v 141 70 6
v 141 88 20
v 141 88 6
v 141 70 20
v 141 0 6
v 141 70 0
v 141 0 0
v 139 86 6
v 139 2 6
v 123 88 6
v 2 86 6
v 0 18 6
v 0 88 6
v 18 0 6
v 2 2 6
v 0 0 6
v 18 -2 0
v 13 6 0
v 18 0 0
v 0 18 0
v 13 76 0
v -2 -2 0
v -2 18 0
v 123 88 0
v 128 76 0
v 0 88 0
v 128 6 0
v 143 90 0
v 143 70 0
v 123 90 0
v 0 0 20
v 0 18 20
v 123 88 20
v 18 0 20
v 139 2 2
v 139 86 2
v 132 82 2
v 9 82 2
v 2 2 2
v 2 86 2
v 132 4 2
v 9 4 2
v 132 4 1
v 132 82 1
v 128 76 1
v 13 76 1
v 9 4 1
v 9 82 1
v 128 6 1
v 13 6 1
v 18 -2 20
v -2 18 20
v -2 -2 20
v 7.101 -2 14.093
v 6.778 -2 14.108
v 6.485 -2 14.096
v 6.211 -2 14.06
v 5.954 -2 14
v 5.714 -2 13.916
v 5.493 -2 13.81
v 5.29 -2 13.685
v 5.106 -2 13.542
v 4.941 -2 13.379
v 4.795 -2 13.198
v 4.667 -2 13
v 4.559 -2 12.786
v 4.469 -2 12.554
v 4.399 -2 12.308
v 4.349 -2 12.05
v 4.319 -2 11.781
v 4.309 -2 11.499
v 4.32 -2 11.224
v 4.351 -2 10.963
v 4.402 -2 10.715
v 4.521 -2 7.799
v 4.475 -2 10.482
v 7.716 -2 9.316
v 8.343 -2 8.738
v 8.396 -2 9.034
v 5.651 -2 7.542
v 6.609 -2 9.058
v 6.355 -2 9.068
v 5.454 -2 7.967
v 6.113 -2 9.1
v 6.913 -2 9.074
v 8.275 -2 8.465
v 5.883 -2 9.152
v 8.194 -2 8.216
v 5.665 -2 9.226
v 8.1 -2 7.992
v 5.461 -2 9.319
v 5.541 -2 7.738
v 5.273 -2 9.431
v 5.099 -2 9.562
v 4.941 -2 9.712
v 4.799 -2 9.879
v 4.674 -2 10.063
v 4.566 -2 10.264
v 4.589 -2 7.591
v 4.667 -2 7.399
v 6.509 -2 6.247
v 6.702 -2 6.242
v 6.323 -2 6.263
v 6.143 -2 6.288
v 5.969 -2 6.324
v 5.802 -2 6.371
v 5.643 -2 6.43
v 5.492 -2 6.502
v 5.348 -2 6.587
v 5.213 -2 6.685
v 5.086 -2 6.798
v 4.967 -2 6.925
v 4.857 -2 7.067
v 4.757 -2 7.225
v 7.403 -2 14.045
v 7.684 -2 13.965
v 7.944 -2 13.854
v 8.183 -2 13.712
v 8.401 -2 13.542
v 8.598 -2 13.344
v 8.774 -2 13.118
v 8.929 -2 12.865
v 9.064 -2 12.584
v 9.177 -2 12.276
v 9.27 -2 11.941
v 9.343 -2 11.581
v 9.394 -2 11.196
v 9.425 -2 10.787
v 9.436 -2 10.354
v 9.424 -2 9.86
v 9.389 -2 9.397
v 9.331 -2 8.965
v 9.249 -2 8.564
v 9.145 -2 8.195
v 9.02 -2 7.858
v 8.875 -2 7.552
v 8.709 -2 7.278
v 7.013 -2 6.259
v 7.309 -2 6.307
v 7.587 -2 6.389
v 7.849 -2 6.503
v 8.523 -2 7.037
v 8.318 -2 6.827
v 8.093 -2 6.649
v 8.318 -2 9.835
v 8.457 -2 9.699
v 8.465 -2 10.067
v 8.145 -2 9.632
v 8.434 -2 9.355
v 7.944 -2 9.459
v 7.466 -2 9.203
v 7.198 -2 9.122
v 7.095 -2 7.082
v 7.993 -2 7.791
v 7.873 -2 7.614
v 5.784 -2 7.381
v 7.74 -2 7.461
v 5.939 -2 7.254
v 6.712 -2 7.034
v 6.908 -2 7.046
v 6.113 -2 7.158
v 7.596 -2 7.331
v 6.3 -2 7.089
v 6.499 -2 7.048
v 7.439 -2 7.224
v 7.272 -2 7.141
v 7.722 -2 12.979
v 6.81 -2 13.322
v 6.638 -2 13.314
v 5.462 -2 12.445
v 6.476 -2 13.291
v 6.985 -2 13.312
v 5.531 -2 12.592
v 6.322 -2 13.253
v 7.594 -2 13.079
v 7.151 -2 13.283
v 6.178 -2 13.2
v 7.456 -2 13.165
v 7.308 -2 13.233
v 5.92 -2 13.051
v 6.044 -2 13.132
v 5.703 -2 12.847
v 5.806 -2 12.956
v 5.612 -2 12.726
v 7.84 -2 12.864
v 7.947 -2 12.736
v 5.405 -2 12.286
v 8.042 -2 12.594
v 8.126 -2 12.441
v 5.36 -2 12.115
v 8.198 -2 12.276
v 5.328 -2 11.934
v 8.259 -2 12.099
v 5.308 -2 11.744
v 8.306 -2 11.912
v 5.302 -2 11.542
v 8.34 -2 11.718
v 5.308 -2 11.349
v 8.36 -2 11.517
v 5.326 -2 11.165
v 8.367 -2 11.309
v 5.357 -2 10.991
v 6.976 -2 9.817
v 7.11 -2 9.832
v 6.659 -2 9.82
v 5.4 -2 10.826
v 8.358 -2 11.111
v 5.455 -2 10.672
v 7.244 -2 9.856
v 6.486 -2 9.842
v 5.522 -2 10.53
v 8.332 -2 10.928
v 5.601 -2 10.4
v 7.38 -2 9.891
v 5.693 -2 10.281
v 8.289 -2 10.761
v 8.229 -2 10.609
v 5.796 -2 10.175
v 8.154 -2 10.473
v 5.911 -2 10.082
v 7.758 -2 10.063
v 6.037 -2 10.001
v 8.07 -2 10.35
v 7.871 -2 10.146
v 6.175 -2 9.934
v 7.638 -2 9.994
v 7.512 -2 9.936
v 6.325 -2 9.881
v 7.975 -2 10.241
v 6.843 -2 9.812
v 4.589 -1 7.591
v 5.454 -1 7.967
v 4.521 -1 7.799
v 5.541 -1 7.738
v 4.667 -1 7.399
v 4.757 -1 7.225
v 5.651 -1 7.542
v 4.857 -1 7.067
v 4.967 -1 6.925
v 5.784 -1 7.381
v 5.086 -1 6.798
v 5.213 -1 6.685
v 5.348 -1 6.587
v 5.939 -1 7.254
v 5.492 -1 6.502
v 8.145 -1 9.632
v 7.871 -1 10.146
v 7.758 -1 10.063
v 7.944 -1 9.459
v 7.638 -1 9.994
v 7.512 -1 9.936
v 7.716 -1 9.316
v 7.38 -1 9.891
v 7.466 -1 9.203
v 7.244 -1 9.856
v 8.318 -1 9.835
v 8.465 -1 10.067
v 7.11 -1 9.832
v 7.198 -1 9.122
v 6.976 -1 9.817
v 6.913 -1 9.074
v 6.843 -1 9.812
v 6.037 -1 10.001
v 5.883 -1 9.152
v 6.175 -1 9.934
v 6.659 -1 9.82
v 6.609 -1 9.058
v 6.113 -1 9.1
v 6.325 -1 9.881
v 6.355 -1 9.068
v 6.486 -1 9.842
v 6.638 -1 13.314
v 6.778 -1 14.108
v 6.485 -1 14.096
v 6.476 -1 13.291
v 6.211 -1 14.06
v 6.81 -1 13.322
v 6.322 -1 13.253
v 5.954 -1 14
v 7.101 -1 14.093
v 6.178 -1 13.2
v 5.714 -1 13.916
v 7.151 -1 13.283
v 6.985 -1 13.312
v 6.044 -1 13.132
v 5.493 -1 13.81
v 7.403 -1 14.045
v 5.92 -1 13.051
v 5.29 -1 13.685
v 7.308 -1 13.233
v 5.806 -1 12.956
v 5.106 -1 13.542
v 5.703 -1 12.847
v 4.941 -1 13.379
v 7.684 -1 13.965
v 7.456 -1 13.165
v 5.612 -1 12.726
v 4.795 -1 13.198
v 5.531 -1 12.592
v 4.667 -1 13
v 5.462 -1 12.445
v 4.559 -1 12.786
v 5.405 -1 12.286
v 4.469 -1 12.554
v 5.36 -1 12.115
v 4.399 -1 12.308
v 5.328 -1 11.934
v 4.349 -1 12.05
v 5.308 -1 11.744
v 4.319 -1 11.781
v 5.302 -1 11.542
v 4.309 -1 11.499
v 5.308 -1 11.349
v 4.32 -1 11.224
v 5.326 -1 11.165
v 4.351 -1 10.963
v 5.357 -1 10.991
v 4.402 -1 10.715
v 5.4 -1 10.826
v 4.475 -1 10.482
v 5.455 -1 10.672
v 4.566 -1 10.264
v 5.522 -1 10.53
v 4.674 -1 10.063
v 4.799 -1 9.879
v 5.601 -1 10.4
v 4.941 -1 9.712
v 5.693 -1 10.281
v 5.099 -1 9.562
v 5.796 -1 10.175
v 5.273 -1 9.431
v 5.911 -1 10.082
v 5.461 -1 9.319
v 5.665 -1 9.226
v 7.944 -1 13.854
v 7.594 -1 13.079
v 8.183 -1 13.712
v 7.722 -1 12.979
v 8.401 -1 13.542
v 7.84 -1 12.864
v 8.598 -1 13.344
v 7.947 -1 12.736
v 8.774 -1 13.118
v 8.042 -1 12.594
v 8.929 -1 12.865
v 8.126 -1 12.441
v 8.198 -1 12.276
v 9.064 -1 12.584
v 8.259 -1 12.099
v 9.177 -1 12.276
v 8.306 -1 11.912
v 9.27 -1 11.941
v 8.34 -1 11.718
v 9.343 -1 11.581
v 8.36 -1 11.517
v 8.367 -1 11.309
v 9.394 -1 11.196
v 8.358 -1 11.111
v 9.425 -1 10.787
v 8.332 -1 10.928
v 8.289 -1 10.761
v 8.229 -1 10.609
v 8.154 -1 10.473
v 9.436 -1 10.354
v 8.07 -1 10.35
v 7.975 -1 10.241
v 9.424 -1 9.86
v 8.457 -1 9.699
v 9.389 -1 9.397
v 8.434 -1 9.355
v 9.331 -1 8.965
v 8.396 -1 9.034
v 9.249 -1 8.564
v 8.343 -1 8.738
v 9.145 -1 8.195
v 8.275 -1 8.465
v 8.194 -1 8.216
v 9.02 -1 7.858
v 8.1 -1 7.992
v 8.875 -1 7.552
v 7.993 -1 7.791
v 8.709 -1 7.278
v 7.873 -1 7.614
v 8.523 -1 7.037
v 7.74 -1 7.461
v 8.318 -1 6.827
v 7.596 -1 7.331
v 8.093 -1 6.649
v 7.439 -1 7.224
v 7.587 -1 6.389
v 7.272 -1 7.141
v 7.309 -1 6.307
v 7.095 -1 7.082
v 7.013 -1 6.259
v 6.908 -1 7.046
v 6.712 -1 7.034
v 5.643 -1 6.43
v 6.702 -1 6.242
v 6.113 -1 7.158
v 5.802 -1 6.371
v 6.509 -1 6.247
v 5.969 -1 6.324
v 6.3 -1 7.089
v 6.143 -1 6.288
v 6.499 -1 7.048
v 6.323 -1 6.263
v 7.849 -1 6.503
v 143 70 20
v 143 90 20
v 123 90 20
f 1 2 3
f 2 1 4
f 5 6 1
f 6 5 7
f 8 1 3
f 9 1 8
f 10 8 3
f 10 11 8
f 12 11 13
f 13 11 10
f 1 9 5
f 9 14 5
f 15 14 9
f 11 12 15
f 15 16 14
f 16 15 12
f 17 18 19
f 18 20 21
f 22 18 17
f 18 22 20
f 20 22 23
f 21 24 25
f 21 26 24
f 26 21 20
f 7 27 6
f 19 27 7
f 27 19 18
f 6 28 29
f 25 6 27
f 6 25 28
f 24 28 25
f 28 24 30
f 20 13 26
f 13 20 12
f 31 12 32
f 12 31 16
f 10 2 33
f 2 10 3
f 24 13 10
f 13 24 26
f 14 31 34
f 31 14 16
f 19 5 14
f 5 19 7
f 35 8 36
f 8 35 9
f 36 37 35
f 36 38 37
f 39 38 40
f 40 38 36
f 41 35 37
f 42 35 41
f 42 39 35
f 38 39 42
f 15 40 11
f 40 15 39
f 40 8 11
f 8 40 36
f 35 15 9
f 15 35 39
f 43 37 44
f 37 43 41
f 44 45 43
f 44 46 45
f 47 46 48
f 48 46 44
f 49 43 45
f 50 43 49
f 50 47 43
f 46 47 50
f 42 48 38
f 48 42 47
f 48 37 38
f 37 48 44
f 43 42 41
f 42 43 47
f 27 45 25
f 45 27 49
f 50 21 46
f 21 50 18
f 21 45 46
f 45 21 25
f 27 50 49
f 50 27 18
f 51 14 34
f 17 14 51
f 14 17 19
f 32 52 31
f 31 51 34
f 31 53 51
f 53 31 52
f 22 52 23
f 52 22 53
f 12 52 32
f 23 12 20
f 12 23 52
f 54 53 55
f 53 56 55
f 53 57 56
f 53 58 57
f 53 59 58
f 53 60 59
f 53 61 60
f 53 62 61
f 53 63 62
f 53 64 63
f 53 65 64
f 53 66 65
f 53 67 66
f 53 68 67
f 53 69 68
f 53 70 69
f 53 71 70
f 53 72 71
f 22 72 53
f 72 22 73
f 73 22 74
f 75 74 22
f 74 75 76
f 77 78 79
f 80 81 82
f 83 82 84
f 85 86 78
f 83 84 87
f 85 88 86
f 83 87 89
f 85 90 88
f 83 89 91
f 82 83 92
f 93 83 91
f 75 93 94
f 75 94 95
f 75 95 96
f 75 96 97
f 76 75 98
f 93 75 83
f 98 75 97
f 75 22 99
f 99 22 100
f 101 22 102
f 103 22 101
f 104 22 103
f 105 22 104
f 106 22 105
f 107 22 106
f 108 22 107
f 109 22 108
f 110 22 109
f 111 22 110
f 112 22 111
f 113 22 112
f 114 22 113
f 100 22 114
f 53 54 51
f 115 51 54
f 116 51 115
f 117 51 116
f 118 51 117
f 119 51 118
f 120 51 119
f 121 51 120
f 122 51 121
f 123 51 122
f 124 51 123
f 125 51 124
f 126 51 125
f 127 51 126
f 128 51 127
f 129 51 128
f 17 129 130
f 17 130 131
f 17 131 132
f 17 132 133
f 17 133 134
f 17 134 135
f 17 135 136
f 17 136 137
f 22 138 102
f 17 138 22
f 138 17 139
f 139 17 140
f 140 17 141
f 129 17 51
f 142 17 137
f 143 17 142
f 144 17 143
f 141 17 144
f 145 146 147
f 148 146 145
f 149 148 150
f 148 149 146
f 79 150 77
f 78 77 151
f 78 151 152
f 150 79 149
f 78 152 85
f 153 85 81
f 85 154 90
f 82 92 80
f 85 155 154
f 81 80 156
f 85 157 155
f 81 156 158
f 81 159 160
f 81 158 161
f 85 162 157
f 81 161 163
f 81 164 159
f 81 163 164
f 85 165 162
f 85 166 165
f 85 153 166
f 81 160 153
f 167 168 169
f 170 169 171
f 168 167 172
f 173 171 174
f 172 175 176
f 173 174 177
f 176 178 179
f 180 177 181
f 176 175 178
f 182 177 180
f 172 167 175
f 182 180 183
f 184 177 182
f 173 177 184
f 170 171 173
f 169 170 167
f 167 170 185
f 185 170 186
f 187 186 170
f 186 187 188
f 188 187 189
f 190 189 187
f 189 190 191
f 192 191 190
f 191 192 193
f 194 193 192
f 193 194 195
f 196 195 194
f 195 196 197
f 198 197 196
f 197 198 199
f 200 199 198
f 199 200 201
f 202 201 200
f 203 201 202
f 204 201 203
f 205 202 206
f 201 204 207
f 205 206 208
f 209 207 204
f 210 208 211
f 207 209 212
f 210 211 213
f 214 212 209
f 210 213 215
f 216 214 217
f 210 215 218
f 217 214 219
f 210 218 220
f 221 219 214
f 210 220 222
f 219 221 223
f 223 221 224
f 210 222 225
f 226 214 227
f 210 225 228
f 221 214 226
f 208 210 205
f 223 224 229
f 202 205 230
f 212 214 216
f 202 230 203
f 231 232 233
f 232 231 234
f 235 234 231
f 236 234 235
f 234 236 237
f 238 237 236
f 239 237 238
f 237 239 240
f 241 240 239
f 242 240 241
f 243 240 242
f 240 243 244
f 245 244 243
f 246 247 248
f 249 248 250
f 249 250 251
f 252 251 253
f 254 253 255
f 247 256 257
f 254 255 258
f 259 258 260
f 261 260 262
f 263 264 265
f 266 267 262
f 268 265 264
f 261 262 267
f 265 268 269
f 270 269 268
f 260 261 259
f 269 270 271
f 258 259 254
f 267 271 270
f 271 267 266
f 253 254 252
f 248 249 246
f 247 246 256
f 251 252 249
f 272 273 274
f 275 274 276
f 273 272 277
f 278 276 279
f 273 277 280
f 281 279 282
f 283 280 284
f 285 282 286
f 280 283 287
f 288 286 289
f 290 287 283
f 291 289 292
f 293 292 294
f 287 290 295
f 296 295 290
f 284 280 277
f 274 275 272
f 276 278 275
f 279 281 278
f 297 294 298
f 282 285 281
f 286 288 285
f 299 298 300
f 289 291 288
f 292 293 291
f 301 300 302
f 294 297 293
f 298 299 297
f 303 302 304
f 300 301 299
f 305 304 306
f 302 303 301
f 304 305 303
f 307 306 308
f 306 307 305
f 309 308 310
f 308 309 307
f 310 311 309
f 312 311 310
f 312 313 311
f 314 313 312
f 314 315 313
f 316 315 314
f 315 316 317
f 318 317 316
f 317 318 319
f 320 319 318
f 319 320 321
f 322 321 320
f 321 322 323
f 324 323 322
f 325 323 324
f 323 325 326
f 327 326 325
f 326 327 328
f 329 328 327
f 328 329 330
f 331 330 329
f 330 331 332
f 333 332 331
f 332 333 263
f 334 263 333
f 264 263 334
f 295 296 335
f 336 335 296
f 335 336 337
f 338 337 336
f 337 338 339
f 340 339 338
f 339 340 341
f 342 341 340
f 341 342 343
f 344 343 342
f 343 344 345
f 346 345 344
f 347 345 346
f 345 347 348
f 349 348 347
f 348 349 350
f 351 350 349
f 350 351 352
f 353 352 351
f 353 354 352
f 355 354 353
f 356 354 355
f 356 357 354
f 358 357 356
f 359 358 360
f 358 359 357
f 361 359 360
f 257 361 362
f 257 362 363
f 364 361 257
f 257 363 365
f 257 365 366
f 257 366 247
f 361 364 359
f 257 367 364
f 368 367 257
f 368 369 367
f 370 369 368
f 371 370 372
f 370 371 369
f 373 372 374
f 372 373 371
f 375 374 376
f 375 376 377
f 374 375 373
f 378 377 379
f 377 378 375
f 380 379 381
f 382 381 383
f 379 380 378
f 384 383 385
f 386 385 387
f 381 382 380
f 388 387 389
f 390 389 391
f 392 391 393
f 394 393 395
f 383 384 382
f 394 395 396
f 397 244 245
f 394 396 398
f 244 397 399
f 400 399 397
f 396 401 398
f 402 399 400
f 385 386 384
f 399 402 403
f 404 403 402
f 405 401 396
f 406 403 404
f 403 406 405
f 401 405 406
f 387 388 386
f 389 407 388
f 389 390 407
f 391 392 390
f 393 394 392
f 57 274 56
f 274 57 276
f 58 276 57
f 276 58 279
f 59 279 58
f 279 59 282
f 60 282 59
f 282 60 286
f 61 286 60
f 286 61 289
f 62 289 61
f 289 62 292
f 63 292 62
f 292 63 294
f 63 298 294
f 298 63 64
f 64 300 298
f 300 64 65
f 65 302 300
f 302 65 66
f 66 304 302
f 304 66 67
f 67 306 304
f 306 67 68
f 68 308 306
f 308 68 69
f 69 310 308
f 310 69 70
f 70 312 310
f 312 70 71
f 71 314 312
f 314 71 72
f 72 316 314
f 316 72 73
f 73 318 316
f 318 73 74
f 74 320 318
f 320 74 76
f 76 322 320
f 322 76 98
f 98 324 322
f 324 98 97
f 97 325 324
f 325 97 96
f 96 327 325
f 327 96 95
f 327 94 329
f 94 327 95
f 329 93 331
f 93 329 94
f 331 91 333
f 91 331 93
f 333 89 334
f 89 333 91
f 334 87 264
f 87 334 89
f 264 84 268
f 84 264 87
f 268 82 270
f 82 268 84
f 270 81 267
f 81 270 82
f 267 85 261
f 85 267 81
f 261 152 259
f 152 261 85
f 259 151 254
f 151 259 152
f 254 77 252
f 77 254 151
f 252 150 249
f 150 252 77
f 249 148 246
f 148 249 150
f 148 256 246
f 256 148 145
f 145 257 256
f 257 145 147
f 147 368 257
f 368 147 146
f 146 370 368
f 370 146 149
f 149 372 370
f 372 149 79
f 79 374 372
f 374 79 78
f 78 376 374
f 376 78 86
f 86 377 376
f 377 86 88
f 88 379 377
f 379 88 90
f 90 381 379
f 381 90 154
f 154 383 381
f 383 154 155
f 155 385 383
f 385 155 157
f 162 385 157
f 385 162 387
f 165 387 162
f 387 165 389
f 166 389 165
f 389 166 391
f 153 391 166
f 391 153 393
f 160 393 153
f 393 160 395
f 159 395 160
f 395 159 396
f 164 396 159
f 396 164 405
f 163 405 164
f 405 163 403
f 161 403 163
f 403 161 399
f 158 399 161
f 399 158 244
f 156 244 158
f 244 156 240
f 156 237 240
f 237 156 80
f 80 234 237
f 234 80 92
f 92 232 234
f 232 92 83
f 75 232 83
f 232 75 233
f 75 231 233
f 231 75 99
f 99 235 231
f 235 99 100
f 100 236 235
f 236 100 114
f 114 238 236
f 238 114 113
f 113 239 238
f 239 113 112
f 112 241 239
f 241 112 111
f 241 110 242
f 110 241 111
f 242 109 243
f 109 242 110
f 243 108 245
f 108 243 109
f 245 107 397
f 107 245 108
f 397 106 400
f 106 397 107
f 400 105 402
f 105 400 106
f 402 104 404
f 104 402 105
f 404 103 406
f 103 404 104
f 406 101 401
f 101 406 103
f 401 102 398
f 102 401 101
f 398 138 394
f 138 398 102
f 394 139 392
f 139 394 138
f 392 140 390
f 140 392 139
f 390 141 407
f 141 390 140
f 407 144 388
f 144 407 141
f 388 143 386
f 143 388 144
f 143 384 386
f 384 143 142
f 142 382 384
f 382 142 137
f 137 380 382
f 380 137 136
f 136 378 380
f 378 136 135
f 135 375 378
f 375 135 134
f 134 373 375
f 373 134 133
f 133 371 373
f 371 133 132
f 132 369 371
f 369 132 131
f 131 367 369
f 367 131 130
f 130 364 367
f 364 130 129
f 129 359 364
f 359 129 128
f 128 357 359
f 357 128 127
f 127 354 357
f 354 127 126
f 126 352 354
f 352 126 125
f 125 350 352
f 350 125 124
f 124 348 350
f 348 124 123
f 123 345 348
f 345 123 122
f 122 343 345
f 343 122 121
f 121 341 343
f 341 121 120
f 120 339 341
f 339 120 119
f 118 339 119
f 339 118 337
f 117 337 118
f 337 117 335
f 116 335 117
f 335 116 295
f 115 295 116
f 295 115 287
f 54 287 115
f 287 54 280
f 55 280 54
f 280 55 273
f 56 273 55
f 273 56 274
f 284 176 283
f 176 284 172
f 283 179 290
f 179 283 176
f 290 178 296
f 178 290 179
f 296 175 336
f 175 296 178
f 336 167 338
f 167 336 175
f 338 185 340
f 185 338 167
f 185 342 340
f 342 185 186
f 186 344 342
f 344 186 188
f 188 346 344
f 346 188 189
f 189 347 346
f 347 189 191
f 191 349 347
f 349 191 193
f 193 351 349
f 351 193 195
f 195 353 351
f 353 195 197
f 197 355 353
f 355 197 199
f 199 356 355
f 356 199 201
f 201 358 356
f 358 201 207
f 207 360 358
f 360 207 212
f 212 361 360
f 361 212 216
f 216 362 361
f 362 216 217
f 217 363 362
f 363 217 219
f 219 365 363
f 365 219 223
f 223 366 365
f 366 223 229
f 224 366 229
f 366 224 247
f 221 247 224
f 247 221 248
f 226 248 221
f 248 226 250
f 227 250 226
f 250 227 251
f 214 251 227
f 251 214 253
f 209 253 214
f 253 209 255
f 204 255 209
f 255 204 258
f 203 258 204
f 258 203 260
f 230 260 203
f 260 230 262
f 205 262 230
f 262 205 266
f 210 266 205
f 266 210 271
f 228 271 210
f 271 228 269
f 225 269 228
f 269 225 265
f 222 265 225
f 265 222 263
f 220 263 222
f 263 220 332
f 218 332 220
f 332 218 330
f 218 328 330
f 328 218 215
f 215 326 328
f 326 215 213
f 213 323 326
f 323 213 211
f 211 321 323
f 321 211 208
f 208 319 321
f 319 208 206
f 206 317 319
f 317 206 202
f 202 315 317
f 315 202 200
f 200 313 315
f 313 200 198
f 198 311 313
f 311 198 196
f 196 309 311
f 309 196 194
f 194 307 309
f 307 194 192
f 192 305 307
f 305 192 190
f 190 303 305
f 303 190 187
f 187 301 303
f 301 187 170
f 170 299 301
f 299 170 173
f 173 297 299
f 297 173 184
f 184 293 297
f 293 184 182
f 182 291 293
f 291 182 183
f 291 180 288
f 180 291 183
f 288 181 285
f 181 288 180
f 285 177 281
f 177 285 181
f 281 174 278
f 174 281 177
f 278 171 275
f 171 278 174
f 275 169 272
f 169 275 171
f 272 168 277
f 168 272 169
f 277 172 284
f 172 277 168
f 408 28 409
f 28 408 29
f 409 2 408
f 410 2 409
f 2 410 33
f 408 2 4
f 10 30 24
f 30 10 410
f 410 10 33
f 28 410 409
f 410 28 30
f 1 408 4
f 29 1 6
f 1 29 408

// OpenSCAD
BaseLength = 137;
BaseDepth = 84;
BaseHeight = 14;
BoardVersion = "6";

TopHeight = 6;
PanelLength = 123;
PanelWidth = 78;

module base_frame() {
  difference() {
    cube([BaseLength+4,BaseDepth+4,BaseHeight]);
    translate([2,2,2])
      cube([BaseLength,BaseDepth,BaseHeight]);
    // holes for panel mount
    translate([6,6,-1])
      cylinder(4,2,2);
    translate([6,BaseDepth-2,-1])
      cylinder(4,2,2);
    translate([BaseLength-1,6,-1])
      cylinder(5,2,2);
    translate([BaseLength-1,BaseDepth-2,-1])
      cylinder(5,2,2);
  }  
}

module port_holes() {
  UsbOffsetX=45;
  UsbLength=15;
  UsbPortGap=4;
  // usb c
  translate([UsbOffsetX,-1,5])
    color("#ff0000")
    cube([UsbLength,4,10]);
  translate([UsbOffsetX+UsbLength+UsbPortGap,-1,5])
    color("#ff0000")
    cube([UsbLength,4,10]);
  // sdcard
  translate([BaseLength+1,BaseDepth-22,5])
    color("#ff0000")
    cube([4,18,10]);
}

module base_final() {
  translate([0,100,0])
    difference() {
      base_frame();
      port_holes();

      // version
      translate([BaseLength/2,BaseDepth/2,-1])
        color("#ff0000")
        linear_extrude(2)
        rotate([0,180,0])
        text(BoardVersion, size=20);
    }
}

module top_frame() {
  difference() {
    cube([BaseLength+4,BaseDepth+4,TopHeight]);
    translate([2,2,2])
      cube([BaseLength,BaseDepth,TopHeight]);
    translate([9, 4,1])
      cube([PanelLength, PanelWidth,3]);
    translate([13, 6,-1])
      cube([PanelLength-8, PanelWidth-8,3]);
  }  
}



module top_final() {
  top_frame();
  translate([-2,-2,0])
    difference() {
      cube([20,20,BaseHeight+TopHeight]);
      translate([2,2,-1])
        cube([20,20,BaseHeight+TopHeight+2]);    
      translate([12,1,14])
        color("#ff0000")
        rotate([90,180,0])
        linear_extrude(5)
        text(BoardVersion,8);
    }
  translate([BaseLength-14,BaseDepth-14,0])
    difference() {
      cube([20,20,BaseHeight+TopHeight]);
      translate([-2,-2,-1])
        cube([20,20,BaseHeight+TopHeight+2]);    
    }
}


//base_final();
top_final();
